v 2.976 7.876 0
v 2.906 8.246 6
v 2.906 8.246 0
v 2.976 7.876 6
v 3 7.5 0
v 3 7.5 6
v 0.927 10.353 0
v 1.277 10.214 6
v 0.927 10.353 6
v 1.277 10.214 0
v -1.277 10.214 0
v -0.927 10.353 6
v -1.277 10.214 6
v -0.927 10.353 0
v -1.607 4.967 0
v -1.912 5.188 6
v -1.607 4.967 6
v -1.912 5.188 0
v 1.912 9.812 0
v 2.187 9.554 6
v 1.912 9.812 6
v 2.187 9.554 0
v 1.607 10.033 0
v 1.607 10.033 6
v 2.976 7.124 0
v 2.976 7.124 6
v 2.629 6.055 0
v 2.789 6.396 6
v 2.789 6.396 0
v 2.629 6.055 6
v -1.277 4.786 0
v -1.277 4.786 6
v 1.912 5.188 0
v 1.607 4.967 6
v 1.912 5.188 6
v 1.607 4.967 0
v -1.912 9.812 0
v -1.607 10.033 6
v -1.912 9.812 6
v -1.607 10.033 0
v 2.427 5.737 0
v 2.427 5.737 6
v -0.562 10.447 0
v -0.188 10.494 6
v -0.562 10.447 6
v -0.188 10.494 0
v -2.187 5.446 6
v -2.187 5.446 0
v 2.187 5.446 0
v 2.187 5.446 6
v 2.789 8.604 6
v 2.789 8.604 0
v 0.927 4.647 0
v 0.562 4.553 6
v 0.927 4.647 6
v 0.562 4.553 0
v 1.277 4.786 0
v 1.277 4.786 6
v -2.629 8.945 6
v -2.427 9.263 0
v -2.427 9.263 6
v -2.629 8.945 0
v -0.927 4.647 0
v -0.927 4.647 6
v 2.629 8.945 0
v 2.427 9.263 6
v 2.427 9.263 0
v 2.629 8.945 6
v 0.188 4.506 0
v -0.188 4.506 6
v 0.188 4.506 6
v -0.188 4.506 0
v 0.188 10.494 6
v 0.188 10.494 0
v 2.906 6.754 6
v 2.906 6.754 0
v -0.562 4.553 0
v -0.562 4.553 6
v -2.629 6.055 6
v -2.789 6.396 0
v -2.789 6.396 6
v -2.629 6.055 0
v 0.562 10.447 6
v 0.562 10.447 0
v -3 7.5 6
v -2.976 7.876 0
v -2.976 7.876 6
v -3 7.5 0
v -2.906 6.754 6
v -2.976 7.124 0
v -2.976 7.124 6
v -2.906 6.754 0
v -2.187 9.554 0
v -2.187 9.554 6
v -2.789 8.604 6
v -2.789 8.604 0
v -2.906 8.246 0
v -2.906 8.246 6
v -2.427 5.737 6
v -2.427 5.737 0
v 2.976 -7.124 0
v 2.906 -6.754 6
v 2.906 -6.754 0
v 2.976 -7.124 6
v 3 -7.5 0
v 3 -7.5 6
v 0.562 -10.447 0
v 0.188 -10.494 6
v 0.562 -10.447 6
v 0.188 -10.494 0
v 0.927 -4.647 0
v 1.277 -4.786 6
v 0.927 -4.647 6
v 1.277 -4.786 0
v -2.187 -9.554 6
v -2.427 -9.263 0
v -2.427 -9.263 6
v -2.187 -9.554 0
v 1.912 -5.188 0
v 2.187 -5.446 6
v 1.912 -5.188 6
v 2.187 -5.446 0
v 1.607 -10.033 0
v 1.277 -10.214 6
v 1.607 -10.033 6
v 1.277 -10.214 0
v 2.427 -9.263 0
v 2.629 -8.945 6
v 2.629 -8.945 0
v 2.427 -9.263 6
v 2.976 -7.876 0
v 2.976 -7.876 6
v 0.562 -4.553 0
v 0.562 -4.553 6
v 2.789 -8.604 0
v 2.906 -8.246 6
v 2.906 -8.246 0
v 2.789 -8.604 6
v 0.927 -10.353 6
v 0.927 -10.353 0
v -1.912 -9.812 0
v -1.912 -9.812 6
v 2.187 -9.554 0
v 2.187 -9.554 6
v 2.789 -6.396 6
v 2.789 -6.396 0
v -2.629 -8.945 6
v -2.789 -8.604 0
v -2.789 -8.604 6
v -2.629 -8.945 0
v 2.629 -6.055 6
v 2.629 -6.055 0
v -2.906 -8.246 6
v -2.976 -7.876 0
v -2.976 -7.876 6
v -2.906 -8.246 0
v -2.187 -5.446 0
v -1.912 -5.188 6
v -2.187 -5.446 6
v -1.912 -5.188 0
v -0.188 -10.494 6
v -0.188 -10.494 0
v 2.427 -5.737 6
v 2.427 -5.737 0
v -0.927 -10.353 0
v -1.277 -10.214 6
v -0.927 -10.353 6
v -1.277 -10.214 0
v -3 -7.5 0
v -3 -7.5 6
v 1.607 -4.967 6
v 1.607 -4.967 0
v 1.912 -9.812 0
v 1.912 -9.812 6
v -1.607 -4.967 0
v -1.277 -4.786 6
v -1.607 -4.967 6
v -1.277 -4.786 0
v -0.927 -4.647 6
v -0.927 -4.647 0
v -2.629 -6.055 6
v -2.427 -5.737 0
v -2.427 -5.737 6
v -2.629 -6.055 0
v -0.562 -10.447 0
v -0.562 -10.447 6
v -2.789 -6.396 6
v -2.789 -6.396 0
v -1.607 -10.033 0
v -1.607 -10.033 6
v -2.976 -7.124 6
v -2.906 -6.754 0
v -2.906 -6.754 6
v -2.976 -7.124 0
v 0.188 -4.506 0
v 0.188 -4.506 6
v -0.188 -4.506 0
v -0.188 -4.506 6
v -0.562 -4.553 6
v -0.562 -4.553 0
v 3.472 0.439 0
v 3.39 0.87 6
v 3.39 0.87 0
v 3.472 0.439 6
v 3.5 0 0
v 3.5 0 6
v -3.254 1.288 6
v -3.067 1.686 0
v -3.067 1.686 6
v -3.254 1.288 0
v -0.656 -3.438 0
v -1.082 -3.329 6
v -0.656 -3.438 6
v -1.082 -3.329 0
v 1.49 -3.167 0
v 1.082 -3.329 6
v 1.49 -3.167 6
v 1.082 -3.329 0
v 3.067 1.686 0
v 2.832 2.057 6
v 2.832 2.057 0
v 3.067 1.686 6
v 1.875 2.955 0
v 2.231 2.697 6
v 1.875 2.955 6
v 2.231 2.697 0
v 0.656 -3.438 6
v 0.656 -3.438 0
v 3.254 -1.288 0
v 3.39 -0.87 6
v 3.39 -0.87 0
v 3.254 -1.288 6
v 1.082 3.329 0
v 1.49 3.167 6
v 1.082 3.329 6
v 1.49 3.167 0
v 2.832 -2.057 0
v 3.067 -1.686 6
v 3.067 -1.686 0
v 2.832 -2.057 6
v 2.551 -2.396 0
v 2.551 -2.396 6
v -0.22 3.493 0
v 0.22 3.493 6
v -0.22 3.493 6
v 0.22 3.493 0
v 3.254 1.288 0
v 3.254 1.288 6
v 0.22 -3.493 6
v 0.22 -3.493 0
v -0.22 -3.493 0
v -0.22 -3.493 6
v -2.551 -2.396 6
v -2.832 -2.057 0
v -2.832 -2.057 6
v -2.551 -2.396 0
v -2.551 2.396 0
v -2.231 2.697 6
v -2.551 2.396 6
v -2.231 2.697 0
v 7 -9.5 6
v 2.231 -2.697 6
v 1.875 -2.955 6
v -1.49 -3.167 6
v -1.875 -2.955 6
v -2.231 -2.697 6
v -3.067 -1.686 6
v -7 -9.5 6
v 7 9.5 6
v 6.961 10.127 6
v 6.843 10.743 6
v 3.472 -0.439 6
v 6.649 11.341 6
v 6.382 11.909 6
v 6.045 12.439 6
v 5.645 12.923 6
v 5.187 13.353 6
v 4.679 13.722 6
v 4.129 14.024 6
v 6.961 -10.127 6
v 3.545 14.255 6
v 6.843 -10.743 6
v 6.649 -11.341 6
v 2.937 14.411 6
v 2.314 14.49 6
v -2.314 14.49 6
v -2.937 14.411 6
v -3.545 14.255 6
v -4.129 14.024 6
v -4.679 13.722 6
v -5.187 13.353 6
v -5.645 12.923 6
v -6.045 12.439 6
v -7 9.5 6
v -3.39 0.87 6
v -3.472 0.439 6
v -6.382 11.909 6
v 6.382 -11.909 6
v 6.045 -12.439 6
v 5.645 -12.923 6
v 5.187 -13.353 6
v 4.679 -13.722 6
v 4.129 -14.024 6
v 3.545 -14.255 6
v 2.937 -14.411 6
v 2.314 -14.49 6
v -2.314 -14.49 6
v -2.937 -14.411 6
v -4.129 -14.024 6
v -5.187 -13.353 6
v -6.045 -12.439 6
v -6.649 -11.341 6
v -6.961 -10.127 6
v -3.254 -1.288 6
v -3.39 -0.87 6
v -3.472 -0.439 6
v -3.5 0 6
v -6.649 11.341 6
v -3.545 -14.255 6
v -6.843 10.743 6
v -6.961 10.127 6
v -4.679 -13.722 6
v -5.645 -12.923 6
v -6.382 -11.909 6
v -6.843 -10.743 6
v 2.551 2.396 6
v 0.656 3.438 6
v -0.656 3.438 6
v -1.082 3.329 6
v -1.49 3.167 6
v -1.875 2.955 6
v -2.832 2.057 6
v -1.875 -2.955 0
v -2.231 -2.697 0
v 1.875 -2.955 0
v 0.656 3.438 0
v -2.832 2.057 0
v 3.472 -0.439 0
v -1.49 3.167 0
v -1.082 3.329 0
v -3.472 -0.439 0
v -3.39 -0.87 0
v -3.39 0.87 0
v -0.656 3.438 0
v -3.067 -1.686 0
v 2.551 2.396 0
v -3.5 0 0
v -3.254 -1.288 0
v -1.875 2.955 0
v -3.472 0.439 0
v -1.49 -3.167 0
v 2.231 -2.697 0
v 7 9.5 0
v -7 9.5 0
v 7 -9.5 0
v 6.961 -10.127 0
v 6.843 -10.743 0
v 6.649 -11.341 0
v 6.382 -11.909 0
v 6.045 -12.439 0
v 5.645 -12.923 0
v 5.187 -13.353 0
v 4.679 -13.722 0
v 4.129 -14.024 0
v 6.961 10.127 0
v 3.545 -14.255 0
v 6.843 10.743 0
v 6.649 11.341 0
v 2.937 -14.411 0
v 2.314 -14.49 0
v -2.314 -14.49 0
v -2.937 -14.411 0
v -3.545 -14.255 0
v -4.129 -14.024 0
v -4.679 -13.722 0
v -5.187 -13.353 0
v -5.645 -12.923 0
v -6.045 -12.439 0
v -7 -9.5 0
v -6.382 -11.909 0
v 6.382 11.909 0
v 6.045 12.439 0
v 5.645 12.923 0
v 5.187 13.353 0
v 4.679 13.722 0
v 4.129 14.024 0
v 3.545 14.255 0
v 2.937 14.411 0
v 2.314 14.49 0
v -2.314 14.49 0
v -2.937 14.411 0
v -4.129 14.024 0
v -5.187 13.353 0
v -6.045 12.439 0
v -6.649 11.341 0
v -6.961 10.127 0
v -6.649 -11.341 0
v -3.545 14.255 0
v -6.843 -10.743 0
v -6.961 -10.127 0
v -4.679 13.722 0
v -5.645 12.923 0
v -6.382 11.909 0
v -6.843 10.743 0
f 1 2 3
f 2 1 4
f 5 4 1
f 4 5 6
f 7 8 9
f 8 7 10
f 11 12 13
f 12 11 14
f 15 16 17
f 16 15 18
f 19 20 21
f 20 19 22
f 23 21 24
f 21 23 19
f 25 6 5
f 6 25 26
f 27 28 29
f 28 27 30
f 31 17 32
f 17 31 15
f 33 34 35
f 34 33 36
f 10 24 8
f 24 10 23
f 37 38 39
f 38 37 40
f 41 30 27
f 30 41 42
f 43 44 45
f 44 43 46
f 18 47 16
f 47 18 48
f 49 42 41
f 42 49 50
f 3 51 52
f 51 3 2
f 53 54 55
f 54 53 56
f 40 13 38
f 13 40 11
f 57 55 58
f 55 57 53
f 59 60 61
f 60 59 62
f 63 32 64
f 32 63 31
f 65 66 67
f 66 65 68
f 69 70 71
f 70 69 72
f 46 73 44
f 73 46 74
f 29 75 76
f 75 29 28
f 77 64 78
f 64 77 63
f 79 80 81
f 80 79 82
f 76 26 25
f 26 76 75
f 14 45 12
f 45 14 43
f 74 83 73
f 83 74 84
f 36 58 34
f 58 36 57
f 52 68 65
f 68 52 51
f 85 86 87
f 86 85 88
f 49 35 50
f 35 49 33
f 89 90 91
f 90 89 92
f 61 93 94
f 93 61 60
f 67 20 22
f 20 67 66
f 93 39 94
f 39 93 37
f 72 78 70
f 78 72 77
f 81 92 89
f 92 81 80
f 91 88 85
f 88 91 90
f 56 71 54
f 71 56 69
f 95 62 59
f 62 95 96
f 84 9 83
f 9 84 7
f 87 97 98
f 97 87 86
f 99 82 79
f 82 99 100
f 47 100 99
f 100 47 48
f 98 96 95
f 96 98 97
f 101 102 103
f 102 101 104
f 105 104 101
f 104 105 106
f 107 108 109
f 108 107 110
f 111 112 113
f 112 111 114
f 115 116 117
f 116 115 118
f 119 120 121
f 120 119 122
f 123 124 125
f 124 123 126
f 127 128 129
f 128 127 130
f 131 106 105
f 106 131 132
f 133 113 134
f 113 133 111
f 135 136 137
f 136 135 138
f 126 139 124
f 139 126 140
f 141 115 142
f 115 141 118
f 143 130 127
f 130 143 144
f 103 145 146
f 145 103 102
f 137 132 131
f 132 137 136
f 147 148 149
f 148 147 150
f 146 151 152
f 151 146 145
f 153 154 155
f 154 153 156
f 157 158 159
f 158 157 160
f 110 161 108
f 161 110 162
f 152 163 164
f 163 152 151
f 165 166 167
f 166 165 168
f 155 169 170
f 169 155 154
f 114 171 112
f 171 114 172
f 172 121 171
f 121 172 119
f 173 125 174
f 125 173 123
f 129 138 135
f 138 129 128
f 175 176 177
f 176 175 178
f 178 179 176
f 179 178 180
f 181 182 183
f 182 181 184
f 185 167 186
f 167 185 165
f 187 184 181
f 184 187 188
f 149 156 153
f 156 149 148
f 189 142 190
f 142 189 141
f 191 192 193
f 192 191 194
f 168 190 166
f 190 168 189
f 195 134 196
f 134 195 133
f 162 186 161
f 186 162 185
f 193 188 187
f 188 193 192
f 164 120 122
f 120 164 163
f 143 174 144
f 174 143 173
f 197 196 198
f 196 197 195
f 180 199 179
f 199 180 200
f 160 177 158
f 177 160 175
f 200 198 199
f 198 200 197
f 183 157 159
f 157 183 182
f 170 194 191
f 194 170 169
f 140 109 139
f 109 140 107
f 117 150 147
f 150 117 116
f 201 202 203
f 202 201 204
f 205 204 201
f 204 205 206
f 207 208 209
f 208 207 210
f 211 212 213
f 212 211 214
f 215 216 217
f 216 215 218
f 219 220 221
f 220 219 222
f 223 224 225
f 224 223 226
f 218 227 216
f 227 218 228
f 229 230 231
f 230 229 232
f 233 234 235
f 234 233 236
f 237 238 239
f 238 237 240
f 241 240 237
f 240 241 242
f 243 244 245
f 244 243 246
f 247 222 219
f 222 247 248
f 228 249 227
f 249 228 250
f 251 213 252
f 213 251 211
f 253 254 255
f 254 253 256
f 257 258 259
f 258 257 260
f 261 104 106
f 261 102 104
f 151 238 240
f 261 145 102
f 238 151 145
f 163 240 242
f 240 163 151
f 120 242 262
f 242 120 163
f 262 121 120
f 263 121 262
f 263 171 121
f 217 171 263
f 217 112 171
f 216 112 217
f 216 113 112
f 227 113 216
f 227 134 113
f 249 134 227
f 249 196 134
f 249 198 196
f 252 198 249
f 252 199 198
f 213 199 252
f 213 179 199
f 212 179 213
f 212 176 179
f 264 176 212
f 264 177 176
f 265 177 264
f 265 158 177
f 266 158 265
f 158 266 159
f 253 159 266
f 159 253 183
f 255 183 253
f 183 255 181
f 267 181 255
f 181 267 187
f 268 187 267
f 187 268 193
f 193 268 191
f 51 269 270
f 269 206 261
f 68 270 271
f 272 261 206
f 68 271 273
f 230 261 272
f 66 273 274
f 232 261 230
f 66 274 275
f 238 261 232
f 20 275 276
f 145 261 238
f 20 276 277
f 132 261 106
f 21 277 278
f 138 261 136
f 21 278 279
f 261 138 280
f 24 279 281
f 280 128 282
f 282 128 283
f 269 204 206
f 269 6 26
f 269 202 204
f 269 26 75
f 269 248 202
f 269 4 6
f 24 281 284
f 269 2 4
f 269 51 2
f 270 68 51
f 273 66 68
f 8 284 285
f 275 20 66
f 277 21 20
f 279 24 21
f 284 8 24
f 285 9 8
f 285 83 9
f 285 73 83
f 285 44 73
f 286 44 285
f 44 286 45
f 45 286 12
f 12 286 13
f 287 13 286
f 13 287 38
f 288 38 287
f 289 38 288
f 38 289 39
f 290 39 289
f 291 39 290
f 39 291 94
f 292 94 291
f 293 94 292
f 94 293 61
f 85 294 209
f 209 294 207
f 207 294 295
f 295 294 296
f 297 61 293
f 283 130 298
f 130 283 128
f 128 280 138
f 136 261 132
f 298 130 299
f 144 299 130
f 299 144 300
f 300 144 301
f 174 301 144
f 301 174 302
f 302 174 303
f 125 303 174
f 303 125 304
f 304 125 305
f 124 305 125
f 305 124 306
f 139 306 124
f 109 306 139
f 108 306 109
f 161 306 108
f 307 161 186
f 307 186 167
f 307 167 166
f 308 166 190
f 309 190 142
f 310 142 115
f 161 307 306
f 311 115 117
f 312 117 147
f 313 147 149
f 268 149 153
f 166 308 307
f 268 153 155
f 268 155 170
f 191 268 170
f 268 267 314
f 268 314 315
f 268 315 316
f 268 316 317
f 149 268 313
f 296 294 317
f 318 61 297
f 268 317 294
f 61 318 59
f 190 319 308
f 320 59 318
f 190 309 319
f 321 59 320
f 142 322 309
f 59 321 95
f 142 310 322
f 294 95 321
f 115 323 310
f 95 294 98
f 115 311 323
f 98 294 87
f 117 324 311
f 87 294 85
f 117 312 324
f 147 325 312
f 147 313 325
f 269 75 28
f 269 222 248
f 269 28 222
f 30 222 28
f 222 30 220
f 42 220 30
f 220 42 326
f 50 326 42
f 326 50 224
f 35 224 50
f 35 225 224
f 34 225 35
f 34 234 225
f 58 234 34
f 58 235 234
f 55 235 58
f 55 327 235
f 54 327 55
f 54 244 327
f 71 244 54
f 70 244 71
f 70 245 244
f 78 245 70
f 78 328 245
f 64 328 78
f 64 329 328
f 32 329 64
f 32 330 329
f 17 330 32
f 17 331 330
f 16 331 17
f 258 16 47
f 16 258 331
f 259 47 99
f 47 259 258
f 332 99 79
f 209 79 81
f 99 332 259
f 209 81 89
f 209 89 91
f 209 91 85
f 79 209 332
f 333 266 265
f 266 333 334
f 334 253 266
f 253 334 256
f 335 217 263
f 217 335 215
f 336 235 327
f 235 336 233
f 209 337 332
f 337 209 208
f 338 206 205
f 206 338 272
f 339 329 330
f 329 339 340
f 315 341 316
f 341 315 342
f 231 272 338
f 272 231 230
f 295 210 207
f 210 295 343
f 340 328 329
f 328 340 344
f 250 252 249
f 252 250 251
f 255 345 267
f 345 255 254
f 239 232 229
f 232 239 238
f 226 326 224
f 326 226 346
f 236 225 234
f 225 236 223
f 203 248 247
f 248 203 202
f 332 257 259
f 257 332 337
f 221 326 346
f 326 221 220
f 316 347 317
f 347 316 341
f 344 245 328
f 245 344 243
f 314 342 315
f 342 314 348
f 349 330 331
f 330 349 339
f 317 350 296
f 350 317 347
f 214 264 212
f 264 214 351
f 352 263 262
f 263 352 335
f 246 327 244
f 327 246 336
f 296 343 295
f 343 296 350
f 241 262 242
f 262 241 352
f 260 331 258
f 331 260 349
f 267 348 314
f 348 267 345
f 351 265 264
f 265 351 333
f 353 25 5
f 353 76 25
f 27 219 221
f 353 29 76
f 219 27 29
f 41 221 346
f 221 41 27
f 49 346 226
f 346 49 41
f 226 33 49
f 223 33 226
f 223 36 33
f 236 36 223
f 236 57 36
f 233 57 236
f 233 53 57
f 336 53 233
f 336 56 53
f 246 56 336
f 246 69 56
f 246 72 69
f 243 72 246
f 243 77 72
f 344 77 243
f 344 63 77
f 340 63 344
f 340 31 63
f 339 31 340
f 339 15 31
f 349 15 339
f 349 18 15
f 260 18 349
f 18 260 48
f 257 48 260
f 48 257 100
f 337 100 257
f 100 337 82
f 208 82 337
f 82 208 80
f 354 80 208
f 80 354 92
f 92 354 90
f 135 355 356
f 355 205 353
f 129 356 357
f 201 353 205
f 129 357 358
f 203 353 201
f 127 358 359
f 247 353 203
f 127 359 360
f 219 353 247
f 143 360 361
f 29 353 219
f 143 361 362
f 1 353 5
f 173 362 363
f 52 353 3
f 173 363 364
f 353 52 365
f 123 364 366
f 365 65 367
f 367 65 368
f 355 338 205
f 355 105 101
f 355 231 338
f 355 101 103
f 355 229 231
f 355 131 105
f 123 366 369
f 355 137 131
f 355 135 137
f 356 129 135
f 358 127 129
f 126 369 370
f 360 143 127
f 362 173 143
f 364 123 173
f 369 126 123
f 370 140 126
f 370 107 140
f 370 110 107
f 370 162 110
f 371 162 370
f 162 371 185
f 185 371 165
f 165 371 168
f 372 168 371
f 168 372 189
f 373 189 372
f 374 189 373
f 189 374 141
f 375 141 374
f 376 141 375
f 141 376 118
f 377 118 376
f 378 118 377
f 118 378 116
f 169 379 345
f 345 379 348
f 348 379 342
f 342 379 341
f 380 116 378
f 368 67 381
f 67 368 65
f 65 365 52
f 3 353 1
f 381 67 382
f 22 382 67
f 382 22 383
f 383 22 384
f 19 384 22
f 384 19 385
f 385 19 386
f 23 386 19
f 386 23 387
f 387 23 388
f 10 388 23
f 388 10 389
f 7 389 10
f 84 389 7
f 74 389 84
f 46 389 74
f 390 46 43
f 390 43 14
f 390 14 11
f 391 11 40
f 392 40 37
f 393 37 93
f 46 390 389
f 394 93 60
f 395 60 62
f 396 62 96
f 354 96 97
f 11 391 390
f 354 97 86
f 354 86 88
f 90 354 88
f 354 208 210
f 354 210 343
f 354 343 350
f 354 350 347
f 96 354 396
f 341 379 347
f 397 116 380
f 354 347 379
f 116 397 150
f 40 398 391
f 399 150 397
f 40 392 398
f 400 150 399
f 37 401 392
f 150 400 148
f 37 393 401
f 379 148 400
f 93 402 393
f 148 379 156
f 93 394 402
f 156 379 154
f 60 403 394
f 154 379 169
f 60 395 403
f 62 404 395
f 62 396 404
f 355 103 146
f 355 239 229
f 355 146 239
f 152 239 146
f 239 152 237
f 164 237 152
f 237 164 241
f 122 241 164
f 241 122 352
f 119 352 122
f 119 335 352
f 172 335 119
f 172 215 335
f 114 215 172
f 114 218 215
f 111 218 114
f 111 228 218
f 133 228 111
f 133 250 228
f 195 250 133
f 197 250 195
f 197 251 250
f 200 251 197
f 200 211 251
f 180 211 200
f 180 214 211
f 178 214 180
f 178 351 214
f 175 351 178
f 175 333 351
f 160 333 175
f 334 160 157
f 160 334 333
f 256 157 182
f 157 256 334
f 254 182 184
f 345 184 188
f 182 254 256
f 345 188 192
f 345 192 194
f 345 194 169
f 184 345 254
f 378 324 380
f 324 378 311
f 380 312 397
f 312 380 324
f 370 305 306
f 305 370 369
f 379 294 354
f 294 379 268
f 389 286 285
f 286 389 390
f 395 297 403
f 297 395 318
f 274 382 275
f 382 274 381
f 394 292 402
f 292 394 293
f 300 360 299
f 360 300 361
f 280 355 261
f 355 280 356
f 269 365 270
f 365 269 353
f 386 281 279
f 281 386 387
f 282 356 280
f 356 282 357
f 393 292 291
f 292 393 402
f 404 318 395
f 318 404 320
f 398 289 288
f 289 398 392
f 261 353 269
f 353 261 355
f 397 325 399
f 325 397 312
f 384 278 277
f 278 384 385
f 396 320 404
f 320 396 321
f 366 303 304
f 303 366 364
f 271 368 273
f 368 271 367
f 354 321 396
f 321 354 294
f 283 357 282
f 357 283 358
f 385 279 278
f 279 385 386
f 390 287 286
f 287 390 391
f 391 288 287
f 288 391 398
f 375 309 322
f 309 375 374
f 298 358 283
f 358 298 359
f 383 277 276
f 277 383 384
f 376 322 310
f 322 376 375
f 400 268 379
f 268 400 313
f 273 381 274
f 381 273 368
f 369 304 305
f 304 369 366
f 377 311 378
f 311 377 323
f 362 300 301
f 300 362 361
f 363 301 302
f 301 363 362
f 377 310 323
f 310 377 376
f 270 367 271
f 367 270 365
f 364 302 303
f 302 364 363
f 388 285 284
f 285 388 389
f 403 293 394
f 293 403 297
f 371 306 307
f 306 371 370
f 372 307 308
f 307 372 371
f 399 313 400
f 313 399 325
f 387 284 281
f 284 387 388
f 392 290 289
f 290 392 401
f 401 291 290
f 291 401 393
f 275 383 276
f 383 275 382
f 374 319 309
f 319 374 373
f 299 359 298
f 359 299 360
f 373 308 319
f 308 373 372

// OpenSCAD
$fn = 50;


difference() {
	union() {
		hull() {
			translate(v = [-2.0000000000, 9.5000000000, 0]) {
				cylinder(h = 6, r = 5);
			}
			translate(v = [2.0000000000, 9.5000000000, 0]) {
				cylinder(h = 6, r = 5);
			}
			translate(v = [-2.0000000000, -9.5000000000, 0]) {
				cylinder(h = 6, r = 5);
			}
			translate(v = [2.0000000000, -9.5000000000, 0]) {
				cylinder(h = 6, r = 5);
			}
		}
	}
	union() {
		#translate(v = [0.0000000000, 7.5000000000, 0]) {
			cylinder(h = 6, r = 3.0000000000);
		}
		#translate(v = [0.0000000000, -7.5000000000, 0]) {
			cylinder(h = 6, r = 3.0000000000);
		}
		#translate(v = [0.0000000000, -7.5000000000, -100.0000000000]) {
			cylinder(h = 200, r = 3.0000000000);
		}
		#translate(v = [0.0000000000, -7.5000000000, -100.0000000000]) {
			cylinder(h = 200, r = 3.0000000000);
		}
		#translate(v = [0.0000000000, 7.5000000000, -100.0000000000]) {
			cylinder(h = 200, r = 3.0000000000);
		}
		#translate(v = [0.0000000000, 7.5000000000, -100.0000000000]) {
			cylinder(h = 200, r = 3.0000000000);
		}
		#translate(v = [0.0000000000, 7.5000000000, 0]) {
			cylinder(h = 6, r = 1.5000000000);
		}
		#translate(v = [0.0000000000, -7.5000000000, 0]) {
			cylinder(h = 6, r = 1.5000000000);
		}
		#translate(v = [0.0000000000, 7.5000000000, 0]) {
			cylinder(h = 6, r = 1.5000000000);
		}
		#translate(v = [0.0000000000, -7.5000000000, 0]) {
			cylinder(h = 6, r = 1.5000000000);
		}
		#translate(v = [0.0000000000, 7.5000000000, 0]) {
			cylinder(h = 6, r = 1.5000000000);
		}
		#translate(v = [0.0000000000, -7.5000000000, 0]) {
			cylinder(h = 6, r = 1.5000000000);
		}
		#cylinder(h = 6, r = 3.5000000000);
	}
}
